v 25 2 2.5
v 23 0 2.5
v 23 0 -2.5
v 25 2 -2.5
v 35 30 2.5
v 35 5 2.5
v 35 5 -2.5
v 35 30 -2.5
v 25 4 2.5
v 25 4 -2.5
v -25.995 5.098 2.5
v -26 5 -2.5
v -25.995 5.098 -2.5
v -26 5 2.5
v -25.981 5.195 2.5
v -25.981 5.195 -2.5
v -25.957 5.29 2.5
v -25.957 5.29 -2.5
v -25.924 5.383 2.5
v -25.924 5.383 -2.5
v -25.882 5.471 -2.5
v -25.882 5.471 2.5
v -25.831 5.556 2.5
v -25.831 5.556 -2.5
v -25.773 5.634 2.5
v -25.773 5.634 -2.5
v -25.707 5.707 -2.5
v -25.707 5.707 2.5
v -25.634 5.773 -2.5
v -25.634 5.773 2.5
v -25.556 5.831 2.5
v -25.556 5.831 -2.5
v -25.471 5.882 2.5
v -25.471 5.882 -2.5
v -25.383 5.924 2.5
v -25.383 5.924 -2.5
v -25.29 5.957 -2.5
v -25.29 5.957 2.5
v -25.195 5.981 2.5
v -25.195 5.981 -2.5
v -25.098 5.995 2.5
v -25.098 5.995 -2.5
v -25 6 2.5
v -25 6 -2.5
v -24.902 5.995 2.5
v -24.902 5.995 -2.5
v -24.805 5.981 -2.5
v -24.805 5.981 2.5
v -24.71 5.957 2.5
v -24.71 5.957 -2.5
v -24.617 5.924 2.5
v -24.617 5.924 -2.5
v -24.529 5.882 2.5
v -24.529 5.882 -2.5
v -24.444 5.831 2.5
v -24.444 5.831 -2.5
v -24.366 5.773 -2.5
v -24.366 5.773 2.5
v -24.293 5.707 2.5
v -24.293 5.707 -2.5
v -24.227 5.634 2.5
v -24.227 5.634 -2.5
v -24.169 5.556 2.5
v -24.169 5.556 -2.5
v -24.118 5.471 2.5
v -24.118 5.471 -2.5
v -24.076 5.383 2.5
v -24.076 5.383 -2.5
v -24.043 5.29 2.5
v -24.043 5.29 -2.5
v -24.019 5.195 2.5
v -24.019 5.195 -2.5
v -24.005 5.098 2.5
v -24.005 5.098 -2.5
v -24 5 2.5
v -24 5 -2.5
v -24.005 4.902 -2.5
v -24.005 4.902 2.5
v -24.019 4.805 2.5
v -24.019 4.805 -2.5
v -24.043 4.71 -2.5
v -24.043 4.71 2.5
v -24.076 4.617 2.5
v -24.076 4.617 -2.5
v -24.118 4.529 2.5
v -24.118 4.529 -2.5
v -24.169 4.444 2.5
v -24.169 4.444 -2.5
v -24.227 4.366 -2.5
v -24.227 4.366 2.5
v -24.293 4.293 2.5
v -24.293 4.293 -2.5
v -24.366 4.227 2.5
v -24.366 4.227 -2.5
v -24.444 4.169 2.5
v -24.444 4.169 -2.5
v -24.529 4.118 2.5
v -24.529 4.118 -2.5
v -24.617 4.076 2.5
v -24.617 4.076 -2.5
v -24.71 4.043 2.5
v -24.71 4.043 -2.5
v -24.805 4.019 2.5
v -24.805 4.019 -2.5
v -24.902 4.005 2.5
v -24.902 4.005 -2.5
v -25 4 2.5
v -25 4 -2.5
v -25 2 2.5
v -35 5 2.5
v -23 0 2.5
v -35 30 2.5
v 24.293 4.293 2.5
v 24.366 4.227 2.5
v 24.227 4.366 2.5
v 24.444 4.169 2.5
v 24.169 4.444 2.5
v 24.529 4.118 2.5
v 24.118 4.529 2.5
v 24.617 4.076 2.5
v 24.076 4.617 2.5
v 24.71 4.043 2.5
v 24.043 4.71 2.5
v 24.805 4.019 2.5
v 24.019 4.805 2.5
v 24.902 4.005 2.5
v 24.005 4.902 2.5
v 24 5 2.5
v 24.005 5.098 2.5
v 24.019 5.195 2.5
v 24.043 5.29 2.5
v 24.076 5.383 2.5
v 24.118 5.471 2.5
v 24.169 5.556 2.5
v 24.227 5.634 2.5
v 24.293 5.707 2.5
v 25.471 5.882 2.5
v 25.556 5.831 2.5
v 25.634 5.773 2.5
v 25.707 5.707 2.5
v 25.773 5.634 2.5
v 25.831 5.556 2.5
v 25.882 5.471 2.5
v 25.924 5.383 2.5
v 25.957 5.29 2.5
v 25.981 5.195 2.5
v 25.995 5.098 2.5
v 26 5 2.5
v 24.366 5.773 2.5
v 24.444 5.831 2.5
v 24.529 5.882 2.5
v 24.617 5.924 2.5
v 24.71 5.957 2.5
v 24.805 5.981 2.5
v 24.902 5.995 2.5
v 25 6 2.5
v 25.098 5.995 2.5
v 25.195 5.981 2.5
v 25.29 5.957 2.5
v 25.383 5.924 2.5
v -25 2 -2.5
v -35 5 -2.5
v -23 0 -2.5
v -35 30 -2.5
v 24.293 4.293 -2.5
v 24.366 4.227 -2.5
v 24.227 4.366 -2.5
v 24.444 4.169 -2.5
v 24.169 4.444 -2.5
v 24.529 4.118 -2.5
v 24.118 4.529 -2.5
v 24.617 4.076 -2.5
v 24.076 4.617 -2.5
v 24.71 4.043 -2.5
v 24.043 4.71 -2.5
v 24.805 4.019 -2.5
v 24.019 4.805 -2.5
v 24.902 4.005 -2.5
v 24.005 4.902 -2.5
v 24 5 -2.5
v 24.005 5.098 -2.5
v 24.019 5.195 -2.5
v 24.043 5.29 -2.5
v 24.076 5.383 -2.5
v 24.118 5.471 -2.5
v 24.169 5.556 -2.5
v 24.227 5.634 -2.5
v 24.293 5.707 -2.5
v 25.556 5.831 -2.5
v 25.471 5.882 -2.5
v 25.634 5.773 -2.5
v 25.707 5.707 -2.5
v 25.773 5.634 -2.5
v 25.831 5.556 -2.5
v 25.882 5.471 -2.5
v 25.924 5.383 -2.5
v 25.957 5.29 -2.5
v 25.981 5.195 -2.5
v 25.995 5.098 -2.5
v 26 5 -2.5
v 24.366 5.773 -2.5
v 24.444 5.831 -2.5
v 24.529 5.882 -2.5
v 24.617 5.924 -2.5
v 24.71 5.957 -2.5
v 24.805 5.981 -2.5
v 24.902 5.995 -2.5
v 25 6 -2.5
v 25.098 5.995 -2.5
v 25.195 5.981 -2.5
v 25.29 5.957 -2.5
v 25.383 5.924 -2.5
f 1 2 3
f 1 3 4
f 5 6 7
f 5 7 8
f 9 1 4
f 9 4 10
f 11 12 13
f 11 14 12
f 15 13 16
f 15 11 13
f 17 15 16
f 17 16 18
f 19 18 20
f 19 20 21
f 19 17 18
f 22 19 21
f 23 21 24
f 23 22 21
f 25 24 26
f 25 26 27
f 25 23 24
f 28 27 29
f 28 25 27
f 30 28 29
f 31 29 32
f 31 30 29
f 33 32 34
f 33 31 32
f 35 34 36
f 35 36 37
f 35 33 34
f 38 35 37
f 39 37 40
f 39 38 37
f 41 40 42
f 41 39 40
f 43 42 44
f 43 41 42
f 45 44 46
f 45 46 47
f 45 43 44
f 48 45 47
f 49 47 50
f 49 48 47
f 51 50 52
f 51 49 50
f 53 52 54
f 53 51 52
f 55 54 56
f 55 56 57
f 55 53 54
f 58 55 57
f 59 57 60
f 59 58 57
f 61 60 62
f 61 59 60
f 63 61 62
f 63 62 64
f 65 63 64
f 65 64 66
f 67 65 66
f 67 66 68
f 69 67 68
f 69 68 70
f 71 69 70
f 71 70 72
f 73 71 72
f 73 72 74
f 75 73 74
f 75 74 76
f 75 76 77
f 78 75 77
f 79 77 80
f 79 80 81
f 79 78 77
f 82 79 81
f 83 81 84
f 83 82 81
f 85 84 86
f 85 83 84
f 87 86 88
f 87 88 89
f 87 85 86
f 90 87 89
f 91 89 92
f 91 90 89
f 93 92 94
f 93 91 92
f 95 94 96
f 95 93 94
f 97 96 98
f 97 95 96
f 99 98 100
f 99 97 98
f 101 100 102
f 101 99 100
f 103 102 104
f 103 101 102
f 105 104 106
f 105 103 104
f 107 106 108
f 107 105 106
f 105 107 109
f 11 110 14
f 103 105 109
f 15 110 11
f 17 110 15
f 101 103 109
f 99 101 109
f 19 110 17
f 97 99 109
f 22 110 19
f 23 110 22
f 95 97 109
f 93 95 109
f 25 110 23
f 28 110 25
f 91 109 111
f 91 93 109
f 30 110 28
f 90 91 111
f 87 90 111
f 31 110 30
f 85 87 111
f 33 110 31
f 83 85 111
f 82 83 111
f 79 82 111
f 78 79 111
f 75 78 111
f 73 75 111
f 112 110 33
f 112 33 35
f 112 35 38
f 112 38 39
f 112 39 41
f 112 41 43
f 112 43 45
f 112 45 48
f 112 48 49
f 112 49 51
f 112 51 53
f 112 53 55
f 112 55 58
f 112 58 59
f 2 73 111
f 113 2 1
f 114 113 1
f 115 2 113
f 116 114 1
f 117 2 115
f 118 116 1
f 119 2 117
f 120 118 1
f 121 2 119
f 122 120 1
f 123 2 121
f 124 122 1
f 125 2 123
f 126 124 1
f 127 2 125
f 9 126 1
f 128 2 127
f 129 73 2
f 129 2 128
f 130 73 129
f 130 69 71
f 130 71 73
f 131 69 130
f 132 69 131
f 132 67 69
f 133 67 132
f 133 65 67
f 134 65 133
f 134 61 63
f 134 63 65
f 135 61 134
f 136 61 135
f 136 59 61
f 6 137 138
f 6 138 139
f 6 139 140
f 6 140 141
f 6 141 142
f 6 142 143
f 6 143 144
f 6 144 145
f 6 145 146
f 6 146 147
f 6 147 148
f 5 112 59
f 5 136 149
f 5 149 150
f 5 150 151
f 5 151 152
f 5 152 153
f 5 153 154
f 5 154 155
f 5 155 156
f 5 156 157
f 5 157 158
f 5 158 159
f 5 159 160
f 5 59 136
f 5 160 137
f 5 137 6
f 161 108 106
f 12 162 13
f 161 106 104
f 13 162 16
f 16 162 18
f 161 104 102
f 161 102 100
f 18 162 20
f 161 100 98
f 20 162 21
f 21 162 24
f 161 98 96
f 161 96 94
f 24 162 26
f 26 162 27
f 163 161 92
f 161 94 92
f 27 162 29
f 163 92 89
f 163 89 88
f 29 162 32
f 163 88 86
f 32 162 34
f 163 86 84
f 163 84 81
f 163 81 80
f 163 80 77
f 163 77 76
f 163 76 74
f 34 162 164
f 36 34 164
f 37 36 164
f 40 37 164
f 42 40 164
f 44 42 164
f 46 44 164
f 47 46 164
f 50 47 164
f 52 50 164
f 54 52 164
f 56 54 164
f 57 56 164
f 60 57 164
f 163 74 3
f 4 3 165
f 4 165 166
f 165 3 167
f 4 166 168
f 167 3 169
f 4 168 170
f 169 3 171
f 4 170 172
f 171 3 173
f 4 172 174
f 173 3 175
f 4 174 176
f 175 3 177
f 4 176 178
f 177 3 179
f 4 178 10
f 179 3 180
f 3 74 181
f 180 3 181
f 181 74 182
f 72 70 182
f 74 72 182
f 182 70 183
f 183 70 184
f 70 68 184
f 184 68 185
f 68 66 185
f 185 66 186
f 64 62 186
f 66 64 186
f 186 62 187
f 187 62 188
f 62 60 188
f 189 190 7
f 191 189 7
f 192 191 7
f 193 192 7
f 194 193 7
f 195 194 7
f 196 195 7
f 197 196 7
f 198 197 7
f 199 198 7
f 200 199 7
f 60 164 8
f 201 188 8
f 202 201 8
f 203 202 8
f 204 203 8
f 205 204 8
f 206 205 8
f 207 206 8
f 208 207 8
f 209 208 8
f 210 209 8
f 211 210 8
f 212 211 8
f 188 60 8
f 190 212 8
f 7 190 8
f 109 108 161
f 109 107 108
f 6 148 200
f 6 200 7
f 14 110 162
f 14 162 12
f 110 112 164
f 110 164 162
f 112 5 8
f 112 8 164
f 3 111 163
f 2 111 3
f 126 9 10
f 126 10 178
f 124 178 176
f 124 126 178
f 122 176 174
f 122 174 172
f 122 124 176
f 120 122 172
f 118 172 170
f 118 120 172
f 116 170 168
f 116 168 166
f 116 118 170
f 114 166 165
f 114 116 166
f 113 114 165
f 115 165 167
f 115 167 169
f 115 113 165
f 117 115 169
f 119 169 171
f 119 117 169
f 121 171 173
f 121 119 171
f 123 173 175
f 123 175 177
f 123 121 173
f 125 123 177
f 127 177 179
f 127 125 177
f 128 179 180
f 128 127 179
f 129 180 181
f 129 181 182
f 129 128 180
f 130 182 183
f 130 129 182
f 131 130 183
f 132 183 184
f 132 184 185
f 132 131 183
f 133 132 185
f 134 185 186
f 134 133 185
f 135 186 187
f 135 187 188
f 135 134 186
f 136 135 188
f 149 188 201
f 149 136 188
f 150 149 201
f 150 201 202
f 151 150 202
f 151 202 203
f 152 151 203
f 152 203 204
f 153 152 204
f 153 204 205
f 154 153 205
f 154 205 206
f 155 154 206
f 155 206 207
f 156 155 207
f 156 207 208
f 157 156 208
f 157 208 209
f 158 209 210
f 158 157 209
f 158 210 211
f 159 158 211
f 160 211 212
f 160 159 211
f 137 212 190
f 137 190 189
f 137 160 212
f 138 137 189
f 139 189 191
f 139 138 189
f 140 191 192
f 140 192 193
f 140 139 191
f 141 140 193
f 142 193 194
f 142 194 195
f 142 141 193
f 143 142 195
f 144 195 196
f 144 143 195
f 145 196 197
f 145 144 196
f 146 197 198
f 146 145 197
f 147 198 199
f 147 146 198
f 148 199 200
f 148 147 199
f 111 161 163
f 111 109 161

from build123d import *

# Parameters (mm, degrees)
EXTRUDE_1_DEPTH = 2.5


with BuildPart() as part:
    # 草圖1 → 填料-伸長1 (new, symmetric)
    with BuildSketch(Plane.XY):
        with BuildLine():
            Line((-25, 2), (-23, 0))
            Line((-23, 0), (23, 0))
            Line((23, 0), (25, 2))
            Line((25, 2), (25, 4))
            ThreePointArc((25, 4), (24.292893219, 5.707106781), (26, 5))
            Line((26, 5), (35, 5))
            Line((35, 5), (35, 30))
            Line((35, 30), (-35, 30))
            Line((-35, 30), (-35, 5))
            Line((-35, 5), (-26, 5))
            ThreePointArc((-26, 5), (-24.292893219, 5.707106781), (-25, 4))
            Line((-25, 4), (-25, 2))
        make_face()
    extrude(amount=EXTRUDE_1_DEPTH, both=True)


solid = part.part
